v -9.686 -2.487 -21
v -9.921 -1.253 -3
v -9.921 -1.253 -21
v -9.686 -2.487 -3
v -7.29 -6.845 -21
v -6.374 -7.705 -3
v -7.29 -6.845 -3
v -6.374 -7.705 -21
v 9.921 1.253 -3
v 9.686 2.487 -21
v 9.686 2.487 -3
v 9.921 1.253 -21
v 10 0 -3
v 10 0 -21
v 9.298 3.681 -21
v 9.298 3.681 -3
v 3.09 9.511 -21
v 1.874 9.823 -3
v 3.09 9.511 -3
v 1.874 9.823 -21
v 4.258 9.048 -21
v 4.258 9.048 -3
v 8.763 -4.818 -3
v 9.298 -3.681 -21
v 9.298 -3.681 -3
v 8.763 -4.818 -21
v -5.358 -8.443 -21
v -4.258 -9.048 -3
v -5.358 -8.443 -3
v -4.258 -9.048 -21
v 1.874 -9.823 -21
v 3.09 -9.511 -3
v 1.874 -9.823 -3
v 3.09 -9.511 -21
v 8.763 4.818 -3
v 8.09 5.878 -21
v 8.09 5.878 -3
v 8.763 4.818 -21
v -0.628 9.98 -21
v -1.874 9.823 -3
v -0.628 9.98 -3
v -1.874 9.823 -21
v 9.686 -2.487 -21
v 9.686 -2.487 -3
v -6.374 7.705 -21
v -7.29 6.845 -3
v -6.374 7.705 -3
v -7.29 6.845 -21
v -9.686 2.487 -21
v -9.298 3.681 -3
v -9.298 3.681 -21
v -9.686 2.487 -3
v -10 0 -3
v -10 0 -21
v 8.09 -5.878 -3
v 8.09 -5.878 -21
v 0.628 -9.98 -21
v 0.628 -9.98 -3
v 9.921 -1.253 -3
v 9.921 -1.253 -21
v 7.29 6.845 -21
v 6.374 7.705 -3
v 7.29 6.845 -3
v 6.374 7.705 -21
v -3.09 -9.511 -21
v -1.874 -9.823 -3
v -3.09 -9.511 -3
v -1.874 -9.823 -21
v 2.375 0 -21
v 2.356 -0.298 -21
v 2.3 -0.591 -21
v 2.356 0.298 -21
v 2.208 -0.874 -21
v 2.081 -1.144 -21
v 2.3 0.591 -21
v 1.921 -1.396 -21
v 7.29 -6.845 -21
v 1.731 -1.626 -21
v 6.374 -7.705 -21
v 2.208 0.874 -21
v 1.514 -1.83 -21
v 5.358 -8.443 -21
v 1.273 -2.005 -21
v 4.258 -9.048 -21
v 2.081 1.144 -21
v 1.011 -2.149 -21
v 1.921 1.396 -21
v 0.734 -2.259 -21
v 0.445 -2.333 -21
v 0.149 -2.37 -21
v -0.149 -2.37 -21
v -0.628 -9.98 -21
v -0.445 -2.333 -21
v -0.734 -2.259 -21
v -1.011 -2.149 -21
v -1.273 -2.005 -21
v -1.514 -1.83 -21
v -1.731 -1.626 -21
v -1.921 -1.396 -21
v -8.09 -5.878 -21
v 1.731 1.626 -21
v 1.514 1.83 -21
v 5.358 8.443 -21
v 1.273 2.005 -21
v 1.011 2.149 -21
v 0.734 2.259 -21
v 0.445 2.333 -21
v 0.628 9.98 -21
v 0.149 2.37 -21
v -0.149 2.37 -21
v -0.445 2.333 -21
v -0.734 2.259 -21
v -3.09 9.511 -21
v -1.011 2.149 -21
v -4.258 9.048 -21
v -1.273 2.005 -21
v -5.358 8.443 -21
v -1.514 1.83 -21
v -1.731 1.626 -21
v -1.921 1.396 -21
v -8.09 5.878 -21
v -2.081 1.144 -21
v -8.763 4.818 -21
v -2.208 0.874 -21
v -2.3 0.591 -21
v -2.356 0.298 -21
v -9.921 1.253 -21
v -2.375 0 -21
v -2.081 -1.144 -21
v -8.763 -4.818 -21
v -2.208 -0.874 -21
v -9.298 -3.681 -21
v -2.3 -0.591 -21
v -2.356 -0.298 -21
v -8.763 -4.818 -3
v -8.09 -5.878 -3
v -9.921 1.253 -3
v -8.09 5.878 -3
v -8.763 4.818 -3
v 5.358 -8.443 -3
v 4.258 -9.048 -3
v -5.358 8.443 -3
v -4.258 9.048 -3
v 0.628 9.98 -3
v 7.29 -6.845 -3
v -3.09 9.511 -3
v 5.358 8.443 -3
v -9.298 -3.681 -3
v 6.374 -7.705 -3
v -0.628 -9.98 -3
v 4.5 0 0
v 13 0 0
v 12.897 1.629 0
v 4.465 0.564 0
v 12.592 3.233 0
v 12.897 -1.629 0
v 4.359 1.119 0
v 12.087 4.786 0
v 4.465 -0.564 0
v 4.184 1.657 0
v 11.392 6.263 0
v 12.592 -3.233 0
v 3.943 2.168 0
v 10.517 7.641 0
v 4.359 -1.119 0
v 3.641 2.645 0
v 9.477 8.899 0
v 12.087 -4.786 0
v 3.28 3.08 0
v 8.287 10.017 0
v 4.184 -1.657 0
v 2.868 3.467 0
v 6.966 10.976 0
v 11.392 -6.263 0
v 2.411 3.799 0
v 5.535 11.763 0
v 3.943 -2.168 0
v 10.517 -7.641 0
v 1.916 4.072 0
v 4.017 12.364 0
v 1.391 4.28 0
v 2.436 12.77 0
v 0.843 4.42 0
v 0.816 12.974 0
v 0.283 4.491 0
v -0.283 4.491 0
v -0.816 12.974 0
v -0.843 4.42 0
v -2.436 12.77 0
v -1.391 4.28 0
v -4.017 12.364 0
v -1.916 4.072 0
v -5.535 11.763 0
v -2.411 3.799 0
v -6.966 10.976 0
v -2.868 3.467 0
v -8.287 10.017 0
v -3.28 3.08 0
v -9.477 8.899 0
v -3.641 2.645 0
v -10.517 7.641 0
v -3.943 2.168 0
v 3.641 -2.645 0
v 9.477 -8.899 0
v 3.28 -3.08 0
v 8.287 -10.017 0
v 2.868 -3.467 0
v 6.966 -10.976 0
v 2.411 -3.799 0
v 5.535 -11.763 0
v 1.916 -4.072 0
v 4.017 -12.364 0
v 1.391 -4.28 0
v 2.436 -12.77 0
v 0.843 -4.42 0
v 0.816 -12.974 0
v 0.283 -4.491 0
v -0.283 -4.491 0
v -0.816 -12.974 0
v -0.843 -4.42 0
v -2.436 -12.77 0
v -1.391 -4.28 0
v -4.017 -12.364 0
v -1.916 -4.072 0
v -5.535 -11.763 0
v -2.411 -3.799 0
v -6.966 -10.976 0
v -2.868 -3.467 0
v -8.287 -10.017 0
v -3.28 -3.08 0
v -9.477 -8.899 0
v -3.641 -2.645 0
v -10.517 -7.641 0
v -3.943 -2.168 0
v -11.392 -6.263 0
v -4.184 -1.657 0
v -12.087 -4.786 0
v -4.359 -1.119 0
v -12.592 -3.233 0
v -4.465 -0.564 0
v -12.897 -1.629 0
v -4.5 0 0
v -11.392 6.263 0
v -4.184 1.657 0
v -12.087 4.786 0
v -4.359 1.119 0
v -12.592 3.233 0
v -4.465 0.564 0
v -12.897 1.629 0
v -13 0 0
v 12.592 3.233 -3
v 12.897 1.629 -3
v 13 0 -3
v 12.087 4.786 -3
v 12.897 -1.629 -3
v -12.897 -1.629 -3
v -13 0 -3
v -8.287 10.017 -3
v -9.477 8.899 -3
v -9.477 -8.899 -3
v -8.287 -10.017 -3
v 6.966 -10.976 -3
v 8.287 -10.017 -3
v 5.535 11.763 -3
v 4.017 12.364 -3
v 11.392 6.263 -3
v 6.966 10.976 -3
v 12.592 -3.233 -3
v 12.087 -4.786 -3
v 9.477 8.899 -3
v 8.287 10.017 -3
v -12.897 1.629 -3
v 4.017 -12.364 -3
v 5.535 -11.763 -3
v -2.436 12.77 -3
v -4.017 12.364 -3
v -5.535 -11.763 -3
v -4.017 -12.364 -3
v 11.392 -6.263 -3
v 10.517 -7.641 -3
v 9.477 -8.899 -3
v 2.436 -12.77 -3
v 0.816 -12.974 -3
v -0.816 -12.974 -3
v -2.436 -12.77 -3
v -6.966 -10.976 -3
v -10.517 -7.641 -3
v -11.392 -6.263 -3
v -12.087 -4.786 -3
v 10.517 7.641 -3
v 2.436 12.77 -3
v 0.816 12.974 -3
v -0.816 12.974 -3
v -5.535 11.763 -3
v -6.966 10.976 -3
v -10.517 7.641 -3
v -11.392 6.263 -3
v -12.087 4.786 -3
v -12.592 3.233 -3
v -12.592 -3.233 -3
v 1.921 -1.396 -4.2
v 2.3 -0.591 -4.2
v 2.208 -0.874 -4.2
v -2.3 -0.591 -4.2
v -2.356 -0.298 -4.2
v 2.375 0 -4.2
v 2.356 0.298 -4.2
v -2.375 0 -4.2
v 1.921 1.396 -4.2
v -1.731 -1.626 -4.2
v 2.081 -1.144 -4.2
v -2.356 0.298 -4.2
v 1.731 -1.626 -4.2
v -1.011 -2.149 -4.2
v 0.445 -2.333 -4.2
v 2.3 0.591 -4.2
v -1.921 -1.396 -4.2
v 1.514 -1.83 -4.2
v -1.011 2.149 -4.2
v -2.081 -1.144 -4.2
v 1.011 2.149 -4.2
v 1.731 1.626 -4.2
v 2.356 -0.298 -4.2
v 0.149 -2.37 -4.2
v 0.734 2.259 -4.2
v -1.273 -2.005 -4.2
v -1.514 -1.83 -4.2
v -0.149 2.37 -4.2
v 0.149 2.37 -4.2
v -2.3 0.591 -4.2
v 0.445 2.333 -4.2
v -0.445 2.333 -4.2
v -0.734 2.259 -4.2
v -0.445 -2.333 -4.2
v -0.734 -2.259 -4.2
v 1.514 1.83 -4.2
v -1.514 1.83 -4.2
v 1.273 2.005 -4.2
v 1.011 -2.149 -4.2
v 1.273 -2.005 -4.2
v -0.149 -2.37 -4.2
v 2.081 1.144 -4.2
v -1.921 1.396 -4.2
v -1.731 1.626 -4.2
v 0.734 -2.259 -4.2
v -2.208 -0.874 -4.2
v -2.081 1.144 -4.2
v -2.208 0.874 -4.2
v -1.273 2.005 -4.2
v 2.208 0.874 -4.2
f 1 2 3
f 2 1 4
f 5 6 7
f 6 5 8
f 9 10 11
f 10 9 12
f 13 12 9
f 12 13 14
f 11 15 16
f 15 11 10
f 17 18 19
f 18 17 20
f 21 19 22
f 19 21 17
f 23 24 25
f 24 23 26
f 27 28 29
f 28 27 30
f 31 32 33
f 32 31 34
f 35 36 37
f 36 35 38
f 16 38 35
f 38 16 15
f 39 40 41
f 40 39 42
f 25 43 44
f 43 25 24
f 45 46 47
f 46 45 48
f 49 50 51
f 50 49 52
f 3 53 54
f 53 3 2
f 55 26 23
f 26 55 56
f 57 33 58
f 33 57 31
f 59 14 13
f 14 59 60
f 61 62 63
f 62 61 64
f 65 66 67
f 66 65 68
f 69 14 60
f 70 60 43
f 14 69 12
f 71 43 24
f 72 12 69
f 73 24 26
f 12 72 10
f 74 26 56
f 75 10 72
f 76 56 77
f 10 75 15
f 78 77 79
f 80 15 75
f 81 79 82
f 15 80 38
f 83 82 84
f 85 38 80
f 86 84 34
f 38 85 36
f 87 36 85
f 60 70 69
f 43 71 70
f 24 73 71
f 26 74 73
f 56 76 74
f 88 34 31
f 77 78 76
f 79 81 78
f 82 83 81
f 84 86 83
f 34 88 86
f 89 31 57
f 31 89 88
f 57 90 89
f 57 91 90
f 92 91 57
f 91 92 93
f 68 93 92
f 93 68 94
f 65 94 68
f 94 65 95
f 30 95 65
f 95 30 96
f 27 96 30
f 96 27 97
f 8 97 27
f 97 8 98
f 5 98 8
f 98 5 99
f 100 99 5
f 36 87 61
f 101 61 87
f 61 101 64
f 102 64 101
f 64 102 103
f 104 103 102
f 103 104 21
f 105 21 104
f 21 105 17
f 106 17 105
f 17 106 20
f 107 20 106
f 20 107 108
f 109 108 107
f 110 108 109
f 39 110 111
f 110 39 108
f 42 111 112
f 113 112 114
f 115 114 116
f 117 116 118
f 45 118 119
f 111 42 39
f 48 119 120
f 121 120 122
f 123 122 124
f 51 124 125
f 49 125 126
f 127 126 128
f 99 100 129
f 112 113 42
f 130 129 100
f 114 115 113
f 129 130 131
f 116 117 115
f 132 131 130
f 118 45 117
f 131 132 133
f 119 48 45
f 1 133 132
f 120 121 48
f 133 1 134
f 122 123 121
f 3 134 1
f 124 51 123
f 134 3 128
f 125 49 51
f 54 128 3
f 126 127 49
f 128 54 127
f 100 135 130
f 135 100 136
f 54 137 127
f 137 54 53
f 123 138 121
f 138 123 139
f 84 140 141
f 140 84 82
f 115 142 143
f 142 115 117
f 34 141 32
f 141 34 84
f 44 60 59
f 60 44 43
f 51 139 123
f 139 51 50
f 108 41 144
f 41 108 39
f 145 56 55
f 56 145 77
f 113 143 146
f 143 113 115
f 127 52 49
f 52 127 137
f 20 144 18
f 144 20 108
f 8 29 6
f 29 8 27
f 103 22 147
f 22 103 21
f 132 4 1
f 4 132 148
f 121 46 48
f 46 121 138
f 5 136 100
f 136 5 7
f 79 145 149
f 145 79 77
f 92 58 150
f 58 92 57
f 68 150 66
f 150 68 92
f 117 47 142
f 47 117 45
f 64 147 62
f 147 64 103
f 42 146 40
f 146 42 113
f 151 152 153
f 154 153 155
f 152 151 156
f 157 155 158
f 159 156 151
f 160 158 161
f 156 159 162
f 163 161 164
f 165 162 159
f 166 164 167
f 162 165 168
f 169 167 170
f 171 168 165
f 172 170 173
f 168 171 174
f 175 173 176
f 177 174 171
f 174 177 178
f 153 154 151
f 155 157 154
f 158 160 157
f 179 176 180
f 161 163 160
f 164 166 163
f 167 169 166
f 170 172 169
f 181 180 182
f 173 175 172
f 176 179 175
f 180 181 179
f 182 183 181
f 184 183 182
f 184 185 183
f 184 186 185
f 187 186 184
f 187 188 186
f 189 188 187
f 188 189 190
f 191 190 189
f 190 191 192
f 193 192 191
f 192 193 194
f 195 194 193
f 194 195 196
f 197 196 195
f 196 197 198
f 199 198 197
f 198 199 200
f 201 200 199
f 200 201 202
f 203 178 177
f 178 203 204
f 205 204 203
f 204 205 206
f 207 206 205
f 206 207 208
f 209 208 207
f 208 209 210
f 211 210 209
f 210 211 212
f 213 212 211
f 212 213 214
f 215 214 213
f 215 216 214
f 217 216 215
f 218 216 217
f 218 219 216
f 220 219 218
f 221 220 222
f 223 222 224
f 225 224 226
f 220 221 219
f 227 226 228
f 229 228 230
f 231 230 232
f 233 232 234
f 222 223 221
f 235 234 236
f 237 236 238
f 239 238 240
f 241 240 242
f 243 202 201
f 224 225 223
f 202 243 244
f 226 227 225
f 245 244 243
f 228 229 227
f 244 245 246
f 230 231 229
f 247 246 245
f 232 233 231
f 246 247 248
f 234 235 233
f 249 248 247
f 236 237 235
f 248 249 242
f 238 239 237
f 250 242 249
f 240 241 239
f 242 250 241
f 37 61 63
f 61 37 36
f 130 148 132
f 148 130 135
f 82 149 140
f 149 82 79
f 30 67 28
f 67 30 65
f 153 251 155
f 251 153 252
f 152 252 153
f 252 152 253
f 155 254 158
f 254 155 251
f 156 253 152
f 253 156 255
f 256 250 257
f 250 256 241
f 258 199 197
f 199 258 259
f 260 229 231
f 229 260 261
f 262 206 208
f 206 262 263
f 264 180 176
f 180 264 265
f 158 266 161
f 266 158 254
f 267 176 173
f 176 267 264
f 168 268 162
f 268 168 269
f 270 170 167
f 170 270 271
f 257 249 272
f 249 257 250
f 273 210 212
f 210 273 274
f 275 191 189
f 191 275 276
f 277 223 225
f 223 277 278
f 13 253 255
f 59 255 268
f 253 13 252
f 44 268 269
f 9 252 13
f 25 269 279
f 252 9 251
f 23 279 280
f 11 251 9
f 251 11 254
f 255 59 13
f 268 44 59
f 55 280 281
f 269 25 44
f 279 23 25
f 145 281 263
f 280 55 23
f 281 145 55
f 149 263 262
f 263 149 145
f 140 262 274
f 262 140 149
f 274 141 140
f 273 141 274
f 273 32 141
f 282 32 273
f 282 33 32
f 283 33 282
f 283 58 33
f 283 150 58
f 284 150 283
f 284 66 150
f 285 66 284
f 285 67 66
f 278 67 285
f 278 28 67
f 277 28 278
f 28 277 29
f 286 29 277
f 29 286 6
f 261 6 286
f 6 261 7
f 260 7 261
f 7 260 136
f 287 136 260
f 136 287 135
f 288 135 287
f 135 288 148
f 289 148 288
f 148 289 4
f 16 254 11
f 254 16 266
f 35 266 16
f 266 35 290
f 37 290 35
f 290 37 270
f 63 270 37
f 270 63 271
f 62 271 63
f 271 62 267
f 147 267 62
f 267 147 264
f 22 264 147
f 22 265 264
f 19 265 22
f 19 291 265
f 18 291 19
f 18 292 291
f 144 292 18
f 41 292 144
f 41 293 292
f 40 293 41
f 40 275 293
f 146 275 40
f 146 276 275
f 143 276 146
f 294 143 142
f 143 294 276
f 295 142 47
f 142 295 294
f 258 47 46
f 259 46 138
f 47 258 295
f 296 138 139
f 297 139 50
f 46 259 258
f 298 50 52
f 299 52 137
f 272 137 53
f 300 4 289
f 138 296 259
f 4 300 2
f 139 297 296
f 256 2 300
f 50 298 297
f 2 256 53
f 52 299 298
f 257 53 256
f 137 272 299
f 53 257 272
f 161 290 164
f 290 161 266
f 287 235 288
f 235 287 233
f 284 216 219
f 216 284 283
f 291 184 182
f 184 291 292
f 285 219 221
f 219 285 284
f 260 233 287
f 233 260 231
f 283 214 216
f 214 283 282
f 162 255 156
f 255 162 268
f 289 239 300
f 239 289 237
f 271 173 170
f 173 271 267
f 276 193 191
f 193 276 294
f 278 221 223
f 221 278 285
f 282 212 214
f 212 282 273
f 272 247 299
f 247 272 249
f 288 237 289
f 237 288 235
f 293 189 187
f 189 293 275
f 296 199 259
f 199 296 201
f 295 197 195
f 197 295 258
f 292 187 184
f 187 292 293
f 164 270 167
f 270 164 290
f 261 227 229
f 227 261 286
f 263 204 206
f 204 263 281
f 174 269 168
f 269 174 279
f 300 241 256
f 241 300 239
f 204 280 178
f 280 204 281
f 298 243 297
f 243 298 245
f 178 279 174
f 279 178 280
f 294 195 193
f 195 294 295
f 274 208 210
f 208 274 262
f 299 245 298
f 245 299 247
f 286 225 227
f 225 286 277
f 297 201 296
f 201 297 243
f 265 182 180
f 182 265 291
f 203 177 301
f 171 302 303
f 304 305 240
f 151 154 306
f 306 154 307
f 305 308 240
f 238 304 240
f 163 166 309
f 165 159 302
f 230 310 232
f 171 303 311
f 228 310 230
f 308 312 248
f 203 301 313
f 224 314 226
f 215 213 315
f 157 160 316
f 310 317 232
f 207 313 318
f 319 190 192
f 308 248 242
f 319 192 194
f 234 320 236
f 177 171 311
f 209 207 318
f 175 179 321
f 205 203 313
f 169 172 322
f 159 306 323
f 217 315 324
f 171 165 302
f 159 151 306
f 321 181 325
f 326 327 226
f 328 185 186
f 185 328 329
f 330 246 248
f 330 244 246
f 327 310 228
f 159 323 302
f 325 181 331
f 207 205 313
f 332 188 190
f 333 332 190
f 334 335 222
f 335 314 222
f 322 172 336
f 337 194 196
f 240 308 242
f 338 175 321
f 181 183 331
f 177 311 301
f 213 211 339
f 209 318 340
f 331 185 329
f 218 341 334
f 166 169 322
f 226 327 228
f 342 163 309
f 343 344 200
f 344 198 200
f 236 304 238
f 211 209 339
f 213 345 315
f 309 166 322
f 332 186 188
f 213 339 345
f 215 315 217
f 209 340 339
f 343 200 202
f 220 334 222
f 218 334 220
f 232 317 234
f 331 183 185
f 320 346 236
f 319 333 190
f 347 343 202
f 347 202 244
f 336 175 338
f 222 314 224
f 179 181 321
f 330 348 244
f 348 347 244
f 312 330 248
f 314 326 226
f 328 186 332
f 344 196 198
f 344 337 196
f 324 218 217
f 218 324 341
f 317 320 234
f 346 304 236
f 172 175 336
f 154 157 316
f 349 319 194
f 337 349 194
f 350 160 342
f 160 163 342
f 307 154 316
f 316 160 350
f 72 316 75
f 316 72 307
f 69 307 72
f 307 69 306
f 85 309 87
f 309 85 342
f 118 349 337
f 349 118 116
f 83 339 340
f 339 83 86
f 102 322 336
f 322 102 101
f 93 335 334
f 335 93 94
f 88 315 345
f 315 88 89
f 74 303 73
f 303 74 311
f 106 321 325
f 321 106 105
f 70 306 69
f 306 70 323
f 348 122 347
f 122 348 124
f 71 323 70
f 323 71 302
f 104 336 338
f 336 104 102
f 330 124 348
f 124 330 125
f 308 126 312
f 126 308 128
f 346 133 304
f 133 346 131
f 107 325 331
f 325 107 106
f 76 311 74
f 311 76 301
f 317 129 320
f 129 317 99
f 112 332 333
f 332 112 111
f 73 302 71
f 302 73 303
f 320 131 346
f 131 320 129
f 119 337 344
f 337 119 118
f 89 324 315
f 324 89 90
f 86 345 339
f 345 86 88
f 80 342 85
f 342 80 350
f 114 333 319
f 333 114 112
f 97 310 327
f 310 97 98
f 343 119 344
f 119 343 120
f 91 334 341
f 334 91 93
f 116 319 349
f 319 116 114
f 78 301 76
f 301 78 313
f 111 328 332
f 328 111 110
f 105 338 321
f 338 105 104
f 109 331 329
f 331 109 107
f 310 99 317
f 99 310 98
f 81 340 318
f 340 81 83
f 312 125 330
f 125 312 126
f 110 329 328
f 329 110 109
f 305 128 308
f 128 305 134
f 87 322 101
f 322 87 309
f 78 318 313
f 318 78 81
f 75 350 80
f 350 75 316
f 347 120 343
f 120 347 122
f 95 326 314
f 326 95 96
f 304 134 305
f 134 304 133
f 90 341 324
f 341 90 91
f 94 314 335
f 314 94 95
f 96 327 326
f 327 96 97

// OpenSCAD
$fn = 50;


difference() {
	union() {
		translate(v = [0, 0, -21.0000000000]) {
			cylinder(h = 21, r = 10.0000000000);
		}
		translate(v = [0, 0, -3.0000000000]) {
			cylinder(h = 3, r = 13.0000000000);
		}
	}
	union() {
		translate(v = [0, 0, 0]) {
			rotate(a = [0, 0, 0]) {
				difference() {
					union() {
						#translate(v = [0, 0, -21.0000000000]) {
							cylinder(h = 21, r = 2.2500000000);
						}
						#translate(v = [0, 0, -4.2000000000]) {
							cylinder(h = 4.2000000000, r = 10.0000000000, r1 = 2.3750000000, r2 = 4.5000000000);
						}
						#translate(v = [0, 0, -21.0000000000]) {
							cylinder(h = 21, r = 2.3750000000);
						}
						#translate(v = [0, 0, -21.0000000000]) {
							cylinder(h = 21, r = 2.2500000000);
						}
					}
					union();
				}
			}
		}
	}
}
